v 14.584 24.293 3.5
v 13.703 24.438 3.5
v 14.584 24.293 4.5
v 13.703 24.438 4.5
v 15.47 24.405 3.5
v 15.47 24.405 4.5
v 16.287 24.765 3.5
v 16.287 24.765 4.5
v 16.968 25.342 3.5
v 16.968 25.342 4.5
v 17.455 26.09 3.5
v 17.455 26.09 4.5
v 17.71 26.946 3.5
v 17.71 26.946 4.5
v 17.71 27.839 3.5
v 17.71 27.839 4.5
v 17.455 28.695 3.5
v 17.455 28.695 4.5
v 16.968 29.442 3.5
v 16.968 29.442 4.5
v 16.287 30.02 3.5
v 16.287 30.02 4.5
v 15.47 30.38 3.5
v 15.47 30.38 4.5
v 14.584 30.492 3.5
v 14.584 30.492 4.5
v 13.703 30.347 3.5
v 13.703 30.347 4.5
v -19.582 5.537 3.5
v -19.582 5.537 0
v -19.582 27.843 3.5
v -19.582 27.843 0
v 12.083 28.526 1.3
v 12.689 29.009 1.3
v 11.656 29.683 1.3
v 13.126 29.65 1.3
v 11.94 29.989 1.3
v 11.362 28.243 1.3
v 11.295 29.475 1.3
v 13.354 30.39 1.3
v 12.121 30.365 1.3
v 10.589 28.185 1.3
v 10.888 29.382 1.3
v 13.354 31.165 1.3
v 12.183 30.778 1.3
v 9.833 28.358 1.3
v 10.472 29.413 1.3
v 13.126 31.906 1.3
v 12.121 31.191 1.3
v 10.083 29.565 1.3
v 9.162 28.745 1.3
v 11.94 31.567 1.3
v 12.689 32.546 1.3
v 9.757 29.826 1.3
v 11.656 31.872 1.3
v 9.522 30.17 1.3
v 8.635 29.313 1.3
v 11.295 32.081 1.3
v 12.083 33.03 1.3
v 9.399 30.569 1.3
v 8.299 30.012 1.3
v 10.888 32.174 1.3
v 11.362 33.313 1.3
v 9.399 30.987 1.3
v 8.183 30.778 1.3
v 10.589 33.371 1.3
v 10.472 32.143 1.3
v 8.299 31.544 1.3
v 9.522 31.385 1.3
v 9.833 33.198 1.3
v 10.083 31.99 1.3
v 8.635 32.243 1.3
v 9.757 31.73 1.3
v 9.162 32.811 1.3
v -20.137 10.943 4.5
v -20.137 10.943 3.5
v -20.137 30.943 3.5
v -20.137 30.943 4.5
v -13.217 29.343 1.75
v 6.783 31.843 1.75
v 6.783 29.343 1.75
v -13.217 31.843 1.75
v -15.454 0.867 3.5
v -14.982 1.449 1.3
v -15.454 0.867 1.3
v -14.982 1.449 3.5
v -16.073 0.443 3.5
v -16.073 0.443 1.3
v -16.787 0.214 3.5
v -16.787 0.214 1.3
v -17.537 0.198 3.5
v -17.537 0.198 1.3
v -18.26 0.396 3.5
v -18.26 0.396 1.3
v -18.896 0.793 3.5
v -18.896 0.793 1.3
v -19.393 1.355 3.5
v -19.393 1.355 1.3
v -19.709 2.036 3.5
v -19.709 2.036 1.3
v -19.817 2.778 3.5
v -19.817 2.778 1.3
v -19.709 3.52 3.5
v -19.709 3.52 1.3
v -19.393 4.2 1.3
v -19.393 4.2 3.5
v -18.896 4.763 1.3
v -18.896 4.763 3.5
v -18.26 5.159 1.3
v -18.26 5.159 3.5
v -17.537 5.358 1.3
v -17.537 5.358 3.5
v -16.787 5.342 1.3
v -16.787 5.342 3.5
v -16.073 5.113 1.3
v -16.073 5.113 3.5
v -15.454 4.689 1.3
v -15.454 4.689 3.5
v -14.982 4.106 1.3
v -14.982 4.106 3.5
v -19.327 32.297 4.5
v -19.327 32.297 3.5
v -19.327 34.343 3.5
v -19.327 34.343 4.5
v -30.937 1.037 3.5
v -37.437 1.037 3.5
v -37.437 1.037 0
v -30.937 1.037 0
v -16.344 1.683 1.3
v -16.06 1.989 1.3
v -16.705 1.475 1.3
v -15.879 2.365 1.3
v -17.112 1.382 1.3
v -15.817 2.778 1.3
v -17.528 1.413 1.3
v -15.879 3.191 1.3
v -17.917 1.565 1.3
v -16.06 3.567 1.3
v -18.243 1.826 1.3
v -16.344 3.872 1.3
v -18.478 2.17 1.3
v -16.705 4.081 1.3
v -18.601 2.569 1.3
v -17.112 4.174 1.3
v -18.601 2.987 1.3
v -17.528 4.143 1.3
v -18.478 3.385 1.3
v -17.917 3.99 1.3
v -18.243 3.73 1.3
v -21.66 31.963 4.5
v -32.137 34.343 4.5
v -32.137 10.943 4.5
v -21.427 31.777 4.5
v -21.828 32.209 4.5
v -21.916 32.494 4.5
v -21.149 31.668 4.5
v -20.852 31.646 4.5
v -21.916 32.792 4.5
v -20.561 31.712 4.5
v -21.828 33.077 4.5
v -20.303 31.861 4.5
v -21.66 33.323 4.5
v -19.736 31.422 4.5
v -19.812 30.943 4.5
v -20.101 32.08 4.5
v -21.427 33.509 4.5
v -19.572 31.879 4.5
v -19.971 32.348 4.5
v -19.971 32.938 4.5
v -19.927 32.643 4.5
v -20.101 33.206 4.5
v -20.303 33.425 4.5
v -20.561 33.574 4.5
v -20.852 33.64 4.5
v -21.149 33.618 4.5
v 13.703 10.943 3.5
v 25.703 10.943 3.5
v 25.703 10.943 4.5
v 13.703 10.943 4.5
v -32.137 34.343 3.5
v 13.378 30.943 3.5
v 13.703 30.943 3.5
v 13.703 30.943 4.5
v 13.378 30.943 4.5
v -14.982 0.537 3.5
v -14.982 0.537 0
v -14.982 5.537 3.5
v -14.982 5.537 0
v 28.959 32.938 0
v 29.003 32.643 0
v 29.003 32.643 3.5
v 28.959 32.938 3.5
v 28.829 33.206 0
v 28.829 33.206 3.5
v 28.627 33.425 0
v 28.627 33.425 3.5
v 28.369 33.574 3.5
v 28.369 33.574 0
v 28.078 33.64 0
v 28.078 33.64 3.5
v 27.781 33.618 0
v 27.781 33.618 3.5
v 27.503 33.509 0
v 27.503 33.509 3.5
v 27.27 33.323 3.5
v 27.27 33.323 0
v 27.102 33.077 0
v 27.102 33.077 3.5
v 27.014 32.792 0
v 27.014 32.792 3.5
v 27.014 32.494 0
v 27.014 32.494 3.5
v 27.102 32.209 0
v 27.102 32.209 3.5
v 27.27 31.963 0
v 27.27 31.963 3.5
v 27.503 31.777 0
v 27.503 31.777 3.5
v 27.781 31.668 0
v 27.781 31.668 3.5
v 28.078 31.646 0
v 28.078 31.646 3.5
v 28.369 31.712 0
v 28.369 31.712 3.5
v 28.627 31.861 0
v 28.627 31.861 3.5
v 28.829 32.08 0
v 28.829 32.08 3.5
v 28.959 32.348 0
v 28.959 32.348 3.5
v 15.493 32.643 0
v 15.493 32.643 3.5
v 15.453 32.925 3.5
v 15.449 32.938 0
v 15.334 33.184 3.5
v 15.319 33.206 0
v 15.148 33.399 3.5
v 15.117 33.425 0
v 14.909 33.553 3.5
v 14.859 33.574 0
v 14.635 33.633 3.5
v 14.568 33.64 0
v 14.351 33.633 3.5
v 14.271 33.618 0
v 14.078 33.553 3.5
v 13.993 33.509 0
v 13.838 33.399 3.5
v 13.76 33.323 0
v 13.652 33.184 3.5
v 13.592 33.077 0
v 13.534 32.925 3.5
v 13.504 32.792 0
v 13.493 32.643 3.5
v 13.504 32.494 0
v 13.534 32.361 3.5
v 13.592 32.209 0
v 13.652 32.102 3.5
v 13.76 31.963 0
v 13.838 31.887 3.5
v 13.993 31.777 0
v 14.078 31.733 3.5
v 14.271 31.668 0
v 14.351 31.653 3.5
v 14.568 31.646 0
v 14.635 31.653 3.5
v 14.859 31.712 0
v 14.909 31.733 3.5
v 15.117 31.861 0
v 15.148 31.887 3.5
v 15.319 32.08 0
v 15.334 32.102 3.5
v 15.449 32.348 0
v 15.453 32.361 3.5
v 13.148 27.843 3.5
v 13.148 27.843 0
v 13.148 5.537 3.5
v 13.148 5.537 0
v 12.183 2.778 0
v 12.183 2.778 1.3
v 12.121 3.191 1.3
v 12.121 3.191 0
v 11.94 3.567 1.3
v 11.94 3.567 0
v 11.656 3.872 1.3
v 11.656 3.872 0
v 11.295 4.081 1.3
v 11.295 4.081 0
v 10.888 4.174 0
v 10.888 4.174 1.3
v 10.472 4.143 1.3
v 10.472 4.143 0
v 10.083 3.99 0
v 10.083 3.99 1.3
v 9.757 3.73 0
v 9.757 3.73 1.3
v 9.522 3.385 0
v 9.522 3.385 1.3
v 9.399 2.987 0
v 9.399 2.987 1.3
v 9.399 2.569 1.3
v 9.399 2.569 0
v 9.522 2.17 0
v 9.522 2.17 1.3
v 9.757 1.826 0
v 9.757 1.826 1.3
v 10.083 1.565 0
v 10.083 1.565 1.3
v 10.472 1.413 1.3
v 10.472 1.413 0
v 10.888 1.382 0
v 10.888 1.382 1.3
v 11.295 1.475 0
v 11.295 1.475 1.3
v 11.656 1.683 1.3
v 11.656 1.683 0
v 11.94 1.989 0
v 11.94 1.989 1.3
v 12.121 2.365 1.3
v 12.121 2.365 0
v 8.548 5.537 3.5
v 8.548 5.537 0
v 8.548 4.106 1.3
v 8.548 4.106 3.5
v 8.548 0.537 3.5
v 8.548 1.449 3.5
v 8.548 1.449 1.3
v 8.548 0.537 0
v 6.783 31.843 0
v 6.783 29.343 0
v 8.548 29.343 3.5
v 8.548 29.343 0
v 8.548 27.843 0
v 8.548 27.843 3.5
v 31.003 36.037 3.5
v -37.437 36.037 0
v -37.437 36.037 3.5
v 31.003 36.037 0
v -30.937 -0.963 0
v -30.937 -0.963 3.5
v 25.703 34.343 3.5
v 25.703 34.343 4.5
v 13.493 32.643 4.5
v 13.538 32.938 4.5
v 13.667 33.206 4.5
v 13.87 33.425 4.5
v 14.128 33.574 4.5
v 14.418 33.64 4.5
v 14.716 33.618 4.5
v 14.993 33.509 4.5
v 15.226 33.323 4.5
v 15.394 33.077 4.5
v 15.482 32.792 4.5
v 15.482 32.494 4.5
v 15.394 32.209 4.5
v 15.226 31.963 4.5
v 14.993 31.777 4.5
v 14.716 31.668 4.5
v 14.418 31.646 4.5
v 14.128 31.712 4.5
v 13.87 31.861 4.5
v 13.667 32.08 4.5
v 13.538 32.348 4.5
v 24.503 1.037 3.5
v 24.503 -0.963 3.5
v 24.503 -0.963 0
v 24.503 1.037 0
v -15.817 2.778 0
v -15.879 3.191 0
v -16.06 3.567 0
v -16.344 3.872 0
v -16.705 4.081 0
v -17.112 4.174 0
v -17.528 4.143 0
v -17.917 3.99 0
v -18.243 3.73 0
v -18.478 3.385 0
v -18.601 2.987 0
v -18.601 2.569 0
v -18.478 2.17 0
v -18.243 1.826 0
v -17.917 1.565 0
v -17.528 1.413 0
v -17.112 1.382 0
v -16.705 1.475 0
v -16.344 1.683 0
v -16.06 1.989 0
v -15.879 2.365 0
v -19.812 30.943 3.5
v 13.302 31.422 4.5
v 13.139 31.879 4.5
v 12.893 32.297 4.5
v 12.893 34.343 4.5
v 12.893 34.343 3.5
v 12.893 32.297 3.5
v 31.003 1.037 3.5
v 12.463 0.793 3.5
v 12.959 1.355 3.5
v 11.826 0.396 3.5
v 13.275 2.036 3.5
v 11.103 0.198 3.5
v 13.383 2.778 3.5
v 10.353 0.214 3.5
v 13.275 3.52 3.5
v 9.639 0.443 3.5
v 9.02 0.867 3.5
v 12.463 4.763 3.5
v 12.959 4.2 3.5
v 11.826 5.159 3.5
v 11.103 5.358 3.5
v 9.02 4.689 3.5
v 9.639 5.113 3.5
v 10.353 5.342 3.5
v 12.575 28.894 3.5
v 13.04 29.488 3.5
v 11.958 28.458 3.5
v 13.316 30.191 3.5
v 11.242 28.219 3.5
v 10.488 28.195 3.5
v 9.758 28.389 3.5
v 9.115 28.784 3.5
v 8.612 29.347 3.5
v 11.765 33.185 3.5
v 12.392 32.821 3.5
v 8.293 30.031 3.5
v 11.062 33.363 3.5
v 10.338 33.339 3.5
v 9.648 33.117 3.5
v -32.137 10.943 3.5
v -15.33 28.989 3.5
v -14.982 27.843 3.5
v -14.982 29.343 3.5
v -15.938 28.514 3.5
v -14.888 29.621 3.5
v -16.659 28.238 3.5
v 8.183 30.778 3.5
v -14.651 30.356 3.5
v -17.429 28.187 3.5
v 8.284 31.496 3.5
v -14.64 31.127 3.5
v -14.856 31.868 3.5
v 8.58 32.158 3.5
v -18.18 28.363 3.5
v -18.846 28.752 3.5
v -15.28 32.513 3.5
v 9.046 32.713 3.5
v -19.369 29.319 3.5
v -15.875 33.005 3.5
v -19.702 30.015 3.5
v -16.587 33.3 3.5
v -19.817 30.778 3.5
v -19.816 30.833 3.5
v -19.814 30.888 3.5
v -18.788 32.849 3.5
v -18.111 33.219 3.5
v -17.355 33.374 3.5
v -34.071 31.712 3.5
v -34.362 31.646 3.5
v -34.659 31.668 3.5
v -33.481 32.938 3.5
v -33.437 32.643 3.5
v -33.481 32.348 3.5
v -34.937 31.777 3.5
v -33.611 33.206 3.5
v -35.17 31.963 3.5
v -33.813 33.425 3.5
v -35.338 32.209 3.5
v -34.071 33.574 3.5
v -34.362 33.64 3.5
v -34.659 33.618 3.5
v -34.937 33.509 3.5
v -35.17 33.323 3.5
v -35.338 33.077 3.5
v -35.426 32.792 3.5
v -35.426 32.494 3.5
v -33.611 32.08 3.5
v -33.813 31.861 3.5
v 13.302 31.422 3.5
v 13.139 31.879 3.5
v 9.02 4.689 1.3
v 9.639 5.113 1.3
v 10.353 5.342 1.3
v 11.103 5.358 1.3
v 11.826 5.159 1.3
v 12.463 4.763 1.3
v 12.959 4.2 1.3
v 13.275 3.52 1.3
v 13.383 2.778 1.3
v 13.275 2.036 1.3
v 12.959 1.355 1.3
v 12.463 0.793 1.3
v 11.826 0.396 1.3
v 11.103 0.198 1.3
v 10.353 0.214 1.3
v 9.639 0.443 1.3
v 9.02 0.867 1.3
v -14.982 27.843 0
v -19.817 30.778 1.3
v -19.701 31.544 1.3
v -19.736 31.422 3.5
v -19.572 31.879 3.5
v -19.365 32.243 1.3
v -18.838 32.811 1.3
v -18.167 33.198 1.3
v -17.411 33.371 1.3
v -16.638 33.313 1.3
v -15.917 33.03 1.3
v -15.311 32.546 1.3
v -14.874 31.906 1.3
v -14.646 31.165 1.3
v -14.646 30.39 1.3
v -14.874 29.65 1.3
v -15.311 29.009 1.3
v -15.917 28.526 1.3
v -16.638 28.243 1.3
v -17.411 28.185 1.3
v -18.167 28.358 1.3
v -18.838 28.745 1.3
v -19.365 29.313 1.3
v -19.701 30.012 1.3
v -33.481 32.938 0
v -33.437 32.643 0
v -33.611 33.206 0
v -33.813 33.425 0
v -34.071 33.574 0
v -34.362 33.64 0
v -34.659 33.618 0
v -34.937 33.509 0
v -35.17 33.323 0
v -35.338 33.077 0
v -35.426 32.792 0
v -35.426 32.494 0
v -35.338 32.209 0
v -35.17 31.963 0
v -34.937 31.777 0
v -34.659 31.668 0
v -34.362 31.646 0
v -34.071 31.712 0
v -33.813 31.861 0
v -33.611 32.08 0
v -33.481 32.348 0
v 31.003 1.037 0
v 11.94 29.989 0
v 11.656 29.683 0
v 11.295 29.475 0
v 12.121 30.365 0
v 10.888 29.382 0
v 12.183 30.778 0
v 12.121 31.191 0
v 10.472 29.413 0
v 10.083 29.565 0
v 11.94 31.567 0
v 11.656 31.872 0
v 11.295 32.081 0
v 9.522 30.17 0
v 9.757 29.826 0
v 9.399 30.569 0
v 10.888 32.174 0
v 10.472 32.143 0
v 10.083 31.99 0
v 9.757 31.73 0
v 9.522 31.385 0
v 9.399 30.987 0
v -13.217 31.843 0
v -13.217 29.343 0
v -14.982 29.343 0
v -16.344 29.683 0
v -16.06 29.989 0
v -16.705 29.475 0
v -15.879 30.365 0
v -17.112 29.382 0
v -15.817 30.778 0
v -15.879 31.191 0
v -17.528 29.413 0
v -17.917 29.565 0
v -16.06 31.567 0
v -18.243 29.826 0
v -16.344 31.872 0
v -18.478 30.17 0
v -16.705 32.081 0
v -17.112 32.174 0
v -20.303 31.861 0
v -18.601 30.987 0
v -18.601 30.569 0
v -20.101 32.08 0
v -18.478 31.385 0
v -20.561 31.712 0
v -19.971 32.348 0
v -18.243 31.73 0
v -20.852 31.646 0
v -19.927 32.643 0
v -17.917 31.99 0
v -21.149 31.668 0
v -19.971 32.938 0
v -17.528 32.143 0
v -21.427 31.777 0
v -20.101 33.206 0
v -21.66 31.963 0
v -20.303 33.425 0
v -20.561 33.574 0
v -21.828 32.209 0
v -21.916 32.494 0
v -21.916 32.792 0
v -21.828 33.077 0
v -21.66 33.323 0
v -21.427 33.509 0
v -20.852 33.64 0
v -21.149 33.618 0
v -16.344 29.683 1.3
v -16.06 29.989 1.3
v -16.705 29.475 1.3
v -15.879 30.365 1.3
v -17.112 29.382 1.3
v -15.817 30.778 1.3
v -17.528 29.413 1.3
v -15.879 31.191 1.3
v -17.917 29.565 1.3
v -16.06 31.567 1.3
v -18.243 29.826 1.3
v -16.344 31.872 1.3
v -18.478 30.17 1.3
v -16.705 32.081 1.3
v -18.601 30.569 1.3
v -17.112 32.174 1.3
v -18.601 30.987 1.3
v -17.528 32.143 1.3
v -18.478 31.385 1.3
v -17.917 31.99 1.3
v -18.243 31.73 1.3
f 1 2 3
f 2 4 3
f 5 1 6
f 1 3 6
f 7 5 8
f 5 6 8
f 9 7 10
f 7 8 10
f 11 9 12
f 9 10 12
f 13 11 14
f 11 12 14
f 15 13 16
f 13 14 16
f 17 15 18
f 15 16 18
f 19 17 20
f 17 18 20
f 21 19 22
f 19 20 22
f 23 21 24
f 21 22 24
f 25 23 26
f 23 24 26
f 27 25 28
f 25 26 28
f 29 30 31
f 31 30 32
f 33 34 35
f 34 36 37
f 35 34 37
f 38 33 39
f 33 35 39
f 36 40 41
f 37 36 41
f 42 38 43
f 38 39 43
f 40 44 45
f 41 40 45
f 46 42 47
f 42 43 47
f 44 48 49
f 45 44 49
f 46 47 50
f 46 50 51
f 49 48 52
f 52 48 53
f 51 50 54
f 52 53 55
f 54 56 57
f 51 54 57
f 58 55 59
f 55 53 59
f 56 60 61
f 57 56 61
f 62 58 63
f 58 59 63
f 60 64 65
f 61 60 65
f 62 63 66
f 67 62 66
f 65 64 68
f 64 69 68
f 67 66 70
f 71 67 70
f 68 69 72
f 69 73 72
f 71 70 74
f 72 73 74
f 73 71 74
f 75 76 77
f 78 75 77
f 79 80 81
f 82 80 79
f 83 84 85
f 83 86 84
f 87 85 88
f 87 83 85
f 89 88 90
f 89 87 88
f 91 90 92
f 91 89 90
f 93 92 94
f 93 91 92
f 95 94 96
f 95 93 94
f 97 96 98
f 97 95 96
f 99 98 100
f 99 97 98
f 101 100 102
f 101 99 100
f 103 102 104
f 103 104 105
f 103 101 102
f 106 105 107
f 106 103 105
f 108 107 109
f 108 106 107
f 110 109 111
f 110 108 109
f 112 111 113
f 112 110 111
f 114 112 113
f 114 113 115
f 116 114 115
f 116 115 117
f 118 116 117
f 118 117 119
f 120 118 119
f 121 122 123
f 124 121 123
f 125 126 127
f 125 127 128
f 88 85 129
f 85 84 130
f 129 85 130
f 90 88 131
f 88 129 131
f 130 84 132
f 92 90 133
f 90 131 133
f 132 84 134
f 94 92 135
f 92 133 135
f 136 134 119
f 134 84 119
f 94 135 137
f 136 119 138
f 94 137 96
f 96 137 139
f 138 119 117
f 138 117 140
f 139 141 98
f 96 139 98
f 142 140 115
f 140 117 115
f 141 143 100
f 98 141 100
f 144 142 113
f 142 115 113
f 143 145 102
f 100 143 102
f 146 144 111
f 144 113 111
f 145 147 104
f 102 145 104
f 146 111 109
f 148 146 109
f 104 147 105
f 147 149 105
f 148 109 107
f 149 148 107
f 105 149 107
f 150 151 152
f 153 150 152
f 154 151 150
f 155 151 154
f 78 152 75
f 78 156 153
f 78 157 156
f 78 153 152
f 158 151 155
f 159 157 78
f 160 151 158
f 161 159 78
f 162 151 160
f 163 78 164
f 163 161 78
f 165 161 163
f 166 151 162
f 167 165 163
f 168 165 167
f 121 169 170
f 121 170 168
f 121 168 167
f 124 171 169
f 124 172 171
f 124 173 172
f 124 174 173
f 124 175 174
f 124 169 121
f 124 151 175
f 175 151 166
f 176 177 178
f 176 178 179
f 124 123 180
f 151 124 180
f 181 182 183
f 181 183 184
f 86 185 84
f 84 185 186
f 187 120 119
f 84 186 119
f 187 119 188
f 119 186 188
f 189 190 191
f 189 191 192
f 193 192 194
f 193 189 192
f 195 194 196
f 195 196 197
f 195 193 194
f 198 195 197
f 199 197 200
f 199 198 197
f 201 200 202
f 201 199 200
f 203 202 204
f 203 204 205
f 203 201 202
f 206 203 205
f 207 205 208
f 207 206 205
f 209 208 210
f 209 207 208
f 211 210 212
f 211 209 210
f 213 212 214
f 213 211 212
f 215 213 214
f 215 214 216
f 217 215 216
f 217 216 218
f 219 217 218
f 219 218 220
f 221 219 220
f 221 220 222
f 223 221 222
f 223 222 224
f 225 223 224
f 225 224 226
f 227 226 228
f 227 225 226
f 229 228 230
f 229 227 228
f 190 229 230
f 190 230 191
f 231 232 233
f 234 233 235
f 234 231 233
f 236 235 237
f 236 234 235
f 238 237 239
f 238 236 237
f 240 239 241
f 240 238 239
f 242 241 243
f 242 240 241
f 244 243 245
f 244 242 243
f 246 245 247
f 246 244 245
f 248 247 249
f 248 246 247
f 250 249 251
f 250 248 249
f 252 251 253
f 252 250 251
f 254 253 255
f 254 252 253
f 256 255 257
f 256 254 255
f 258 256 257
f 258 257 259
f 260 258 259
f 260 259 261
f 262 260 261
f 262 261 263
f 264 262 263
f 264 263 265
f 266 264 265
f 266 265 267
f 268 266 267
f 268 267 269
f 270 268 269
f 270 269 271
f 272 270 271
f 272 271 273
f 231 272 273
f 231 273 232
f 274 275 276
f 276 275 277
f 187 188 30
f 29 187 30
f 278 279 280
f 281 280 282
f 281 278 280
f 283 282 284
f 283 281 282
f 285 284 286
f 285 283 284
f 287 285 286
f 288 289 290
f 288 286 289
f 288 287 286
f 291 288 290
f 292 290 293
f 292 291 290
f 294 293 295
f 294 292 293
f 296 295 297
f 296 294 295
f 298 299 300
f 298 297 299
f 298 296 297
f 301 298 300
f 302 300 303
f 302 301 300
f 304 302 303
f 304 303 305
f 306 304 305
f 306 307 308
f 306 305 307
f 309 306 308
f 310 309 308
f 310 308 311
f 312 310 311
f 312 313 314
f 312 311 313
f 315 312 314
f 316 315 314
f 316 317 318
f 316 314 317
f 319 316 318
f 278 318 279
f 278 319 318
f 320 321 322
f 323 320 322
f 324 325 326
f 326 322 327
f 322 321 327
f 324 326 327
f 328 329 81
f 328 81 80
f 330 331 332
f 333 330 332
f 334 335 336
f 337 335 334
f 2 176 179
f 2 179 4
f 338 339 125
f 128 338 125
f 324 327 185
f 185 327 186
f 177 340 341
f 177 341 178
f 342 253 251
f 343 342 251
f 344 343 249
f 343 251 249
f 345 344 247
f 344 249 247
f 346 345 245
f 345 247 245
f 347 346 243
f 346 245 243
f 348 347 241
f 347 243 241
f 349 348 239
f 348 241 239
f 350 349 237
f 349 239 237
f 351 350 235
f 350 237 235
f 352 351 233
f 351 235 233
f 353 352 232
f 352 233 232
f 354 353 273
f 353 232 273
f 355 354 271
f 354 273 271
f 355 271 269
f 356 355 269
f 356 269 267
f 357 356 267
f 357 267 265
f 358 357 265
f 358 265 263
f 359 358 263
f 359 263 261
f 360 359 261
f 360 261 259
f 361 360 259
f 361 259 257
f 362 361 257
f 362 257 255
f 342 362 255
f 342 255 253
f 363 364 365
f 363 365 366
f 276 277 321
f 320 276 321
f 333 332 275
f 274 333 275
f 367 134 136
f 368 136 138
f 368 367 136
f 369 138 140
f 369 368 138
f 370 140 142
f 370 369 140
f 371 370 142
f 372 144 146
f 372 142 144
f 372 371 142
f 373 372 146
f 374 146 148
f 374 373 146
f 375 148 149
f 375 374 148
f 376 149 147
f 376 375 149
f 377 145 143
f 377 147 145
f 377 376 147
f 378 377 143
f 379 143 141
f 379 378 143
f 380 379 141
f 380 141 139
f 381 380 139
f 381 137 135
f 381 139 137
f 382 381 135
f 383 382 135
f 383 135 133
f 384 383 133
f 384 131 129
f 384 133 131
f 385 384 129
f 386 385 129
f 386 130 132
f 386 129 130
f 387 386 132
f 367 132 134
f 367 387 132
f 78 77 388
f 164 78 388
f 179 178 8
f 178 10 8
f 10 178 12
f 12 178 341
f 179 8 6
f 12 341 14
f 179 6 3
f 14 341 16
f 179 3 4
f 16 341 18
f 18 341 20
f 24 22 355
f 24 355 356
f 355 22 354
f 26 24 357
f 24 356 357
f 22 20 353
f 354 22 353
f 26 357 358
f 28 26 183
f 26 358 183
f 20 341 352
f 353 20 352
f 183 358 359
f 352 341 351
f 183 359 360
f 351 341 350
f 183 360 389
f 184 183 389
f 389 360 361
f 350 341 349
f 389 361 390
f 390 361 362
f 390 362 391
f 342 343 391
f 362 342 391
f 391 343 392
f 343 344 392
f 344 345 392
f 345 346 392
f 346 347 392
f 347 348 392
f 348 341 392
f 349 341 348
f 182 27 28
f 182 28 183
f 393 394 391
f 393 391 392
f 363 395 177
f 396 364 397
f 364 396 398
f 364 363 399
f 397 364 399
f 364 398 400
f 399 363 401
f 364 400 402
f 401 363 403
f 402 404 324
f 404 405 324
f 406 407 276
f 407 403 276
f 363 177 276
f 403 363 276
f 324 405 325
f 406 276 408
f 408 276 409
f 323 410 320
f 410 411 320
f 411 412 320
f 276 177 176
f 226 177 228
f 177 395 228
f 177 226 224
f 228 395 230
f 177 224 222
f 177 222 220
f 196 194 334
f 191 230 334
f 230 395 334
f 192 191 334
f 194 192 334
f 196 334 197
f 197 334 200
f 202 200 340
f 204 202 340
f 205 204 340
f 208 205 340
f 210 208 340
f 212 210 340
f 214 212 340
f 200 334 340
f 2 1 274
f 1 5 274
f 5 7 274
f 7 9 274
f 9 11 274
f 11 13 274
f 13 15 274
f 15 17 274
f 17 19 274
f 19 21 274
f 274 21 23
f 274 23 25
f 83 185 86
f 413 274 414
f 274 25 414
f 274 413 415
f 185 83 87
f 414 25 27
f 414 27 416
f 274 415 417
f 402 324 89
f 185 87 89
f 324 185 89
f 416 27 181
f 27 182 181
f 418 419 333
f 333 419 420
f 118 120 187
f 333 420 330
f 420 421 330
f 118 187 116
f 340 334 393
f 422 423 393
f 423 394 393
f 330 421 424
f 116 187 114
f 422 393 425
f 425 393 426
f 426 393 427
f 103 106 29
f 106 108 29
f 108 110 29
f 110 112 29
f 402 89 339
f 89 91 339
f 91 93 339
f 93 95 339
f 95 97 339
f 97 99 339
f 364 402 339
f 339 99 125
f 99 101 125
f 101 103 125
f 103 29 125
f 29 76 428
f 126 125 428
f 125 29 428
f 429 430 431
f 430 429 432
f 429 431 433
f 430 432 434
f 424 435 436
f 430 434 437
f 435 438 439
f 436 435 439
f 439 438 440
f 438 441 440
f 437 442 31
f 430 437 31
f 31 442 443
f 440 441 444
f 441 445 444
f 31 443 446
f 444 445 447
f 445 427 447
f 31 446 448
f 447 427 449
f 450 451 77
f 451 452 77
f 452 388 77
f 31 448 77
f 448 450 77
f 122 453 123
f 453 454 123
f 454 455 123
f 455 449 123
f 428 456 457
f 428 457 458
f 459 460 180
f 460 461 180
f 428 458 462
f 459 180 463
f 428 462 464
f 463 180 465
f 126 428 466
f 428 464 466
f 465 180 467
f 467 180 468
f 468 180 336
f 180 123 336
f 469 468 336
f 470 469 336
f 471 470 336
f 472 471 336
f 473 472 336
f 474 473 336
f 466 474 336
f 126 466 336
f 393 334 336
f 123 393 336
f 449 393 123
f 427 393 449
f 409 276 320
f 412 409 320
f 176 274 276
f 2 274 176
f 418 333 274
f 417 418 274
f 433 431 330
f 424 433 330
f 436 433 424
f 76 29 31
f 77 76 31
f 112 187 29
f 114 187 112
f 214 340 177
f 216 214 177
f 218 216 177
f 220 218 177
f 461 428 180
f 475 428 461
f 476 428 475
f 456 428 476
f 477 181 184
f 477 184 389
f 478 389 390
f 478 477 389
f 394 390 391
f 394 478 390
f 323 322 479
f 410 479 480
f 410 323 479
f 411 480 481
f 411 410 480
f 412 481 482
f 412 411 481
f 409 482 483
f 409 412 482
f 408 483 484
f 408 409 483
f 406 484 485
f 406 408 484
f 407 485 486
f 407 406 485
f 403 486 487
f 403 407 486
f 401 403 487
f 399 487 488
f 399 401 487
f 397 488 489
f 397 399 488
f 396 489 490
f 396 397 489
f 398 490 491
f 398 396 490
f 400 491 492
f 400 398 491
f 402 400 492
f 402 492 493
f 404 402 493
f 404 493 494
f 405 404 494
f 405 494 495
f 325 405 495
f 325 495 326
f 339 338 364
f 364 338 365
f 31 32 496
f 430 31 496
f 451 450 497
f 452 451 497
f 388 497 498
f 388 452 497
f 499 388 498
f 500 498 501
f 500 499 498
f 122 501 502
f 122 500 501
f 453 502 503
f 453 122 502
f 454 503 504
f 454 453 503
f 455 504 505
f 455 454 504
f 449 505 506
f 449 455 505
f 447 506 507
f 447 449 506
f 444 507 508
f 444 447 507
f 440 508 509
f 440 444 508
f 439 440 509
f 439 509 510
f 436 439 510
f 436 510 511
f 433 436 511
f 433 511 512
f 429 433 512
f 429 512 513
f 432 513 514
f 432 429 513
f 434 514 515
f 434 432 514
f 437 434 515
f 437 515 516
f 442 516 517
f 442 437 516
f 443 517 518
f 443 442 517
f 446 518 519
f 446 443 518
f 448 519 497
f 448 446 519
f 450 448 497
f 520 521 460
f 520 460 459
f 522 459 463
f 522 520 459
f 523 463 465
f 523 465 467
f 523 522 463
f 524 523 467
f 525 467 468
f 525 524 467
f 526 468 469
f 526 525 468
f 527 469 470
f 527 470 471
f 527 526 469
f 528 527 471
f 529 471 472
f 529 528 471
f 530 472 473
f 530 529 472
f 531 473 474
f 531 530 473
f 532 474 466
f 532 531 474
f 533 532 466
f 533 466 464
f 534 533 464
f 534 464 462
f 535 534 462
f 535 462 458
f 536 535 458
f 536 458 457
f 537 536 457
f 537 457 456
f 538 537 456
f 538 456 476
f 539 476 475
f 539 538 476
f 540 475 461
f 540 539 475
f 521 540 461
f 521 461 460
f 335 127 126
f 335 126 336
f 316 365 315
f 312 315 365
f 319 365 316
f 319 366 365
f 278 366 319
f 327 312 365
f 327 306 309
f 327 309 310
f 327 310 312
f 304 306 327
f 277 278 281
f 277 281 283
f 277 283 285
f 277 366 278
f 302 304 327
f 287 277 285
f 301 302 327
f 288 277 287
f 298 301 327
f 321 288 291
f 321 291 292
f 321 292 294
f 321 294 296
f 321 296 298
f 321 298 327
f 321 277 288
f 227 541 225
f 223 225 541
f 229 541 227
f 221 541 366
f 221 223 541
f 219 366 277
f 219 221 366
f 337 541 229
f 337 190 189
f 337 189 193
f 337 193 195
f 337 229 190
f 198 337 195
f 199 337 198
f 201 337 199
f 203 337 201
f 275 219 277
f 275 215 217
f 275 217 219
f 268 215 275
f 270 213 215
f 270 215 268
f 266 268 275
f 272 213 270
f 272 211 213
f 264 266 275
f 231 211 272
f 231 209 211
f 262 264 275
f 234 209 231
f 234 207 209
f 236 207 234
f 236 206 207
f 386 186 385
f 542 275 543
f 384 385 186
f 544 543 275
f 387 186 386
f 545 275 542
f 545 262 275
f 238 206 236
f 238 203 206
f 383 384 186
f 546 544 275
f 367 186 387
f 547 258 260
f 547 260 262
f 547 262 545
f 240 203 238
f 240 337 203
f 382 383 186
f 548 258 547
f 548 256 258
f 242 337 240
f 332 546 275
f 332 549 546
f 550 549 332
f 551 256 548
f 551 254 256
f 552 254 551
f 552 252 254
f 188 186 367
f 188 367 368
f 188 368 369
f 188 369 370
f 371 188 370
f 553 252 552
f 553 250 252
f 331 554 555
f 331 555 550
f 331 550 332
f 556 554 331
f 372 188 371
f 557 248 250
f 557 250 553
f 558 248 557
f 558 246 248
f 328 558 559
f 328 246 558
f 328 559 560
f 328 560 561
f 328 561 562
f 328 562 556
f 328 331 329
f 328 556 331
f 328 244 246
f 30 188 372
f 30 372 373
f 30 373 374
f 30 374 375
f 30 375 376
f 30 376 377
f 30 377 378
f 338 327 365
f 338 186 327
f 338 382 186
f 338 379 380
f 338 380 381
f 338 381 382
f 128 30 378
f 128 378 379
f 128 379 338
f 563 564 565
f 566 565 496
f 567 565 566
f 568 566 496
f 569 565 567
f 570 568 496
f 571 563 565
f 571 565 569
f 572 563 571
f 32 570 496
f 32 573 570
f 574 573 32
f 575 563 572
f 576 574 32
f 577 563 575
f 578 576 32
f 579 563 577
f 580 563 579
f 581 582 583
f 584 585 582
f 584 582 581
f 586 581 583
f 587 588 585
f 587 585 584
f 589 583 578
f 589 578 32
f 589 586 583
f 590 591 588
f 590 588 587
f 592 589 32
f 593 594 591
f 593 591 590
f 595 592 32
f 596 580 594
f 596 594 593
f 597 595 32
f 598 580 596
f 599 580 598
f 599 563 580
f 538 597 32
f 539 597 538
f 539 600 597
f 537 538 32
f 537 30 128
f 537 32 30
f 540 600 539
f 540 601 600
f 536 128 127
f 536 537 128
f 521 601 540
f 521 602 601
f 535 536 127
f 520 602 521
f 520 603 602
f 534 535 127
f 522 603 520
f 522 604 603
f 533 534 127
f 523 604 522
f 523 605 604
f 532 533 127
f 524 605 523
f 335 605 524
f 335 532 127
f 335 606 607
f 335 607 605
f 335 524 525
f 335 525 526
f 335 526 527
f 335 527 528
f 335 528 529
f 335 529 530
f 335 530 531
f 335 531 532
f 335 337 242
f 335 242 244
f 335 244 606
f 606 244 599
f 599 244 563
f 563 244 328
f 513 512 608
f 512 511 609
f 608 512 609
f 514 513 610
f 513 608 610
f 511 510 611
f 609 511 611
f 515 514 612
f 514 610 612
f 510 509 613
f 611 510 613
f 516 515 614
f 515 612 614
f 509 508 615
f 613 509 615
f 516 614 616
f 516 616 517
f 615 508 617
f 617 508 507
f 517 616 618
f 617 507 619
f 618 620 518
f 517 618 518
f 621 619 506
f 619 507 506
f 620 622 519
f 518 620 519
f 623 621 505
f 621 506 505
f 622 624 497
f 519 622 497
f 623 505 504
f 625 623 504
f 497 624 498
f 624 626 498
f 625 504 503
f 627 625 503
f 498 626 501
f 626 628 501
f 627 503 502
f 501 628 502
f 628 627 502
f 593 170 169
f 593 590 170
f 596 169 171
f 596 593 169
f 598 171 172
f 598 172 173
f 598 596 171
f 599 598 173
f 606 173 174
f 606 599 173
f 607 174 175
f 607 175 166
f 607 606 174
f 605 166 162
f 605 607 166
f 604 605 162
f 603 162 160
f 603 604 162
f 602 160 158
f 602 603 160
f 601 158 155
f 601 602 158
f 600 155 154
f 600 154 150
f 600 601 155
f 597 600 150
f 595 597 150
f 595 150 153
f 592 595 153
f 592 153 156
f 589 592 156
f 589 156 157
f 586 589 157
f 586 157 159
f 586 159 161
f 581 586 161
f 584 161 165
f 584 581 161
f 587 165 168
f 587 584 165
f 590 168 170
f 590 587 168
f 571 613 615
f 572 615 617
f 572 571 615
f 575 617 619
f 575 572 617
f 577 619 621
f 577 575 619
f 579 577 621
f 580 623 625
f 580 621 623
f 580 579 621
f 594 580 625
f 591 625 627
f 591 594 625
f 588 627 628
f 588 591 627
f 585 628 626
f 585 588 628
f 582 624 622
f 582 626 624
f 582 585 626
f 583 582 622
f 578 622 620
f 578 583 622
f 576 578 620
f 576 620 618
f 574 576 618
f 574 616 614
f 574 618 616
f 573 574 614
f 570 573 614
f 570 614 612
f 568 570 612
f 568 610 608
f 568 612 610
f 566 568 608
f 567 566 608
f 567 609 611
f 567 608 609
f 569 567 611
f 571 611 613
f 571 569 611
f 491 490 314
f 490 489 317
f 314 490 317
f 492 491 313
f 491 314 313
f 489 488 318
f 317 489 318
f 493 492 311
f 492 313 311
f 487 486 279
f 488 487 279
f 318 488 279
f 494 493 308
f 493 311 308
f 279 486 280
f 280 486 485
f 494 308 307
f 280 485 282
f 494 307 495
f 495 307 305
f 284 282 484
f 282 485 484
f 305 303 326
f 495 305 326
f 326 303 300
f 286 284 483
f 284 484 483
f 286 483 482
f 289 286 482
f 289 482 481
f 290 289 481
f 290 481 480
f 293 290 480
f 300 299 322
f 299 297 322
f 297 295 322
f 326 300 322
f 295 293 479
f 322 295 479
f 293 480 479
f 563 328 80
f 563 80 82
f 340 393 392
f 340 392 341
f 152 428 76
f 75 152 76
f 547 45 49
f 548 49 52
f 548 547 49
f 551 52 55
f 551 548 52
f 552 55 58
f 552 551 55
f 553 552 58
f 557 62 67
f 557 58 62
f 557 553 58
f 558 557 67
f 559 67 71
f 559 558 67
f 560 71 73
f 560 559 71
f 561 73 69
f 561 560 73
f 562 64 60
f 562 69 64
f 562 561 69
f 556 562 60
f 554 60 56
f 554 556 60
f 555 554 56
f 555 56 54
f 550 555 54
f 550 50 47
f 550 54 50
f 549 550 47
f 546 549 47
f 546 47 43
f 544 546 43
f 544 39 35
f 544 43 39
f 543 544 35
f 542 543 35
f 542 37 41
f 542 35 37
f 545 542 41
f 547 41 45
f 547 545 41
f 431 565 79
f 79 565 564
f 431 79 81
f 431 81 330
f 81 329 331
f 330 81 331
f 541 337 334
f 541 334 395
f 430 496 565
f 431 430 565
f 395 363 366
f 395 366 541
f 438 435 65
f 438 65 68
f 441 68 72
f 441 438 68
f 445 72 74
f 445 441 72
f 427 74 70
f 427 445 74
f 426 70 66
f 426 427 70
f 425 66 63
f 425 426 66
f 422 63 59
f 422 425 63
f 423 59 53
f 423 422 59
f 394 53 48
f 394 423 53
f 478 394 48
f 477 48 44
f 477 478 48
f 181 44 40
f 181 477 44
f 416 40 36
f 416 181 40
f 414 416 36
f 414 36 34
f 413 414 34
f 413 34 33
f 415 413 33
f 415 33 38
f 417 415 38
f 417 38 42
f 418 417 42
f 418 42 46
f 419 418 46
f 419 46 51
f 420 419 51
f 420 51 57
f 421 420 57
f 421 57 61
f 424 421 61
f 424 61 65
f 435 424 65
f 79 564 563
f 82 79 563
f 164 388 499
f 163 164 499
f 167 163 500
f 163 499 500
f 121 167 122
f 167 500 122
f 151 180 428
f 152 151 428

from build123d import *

# Parameters (mm, degrees)
SKETCH3_R           = 1.4
SKETCH3_R_2         = 1
BOSS_EXTRUDE1_DEPTH = 3.5
SKETCH9_R           = 2.6
CUT_EXTRUDE1_DEPTH  = 2.2
SKETCH10_W          = 20
SKETCH10_H          = 2.5
CUT_EXTRUDE2_DEPTH  = 1.75
SKETCH11_R          = 1
BOSS_EXTRUDE2_DEPTH = 1
SKETCH14_R          = 3.1
CUT_EXTRUDE3_DEPTH  = 1
SKETCH15_W          = 6.5
SKETCH15_H          = 2
CUT_EXTRUDE4_DEPTH  = 53.08126138


with BuildPart() as part:
    # Sketch3 → Boss-Extrude1 (new body)
    with BuildSketch(Plane.XY):
        Polygon((-37.436821352, -0.962627815), (-37.436821352, 36.037372185), (31.003178648, 36.037372185), (31.003178648, -0.962627815), (7.298178648, -0.962627815), (-14.831821352, -0.962627815), align=None)
        with Locations((-17.216821352, 30.777902568)):
            Circle(SKETCH3_R, mode=Mode.SUBTRACT)
        with Locations((-34.436821352, 32.642902568)):
            Circle(SKETCH3_R_2, mode=Mode.SUBTRACT)
        with Locations((-20.926821352, 32.642902568)):
            Circle(SKETCH3_R_2, mode=Mode.SUBTRACT)
        with Locations((14.493178648, 32.642902568)):
            Circle(SKETCH3_R_2, mode=Mode.SUBTRACT)
        with Locations((28.003178648, 32.642902568)):
            Circle(SKETCH3_R_2, mode=Mode.SUBTRACT)
        with Locations((-17.216821352, 2.777902568)):
            Circle(SKETCH3_R, mode=Mode.SUBTRACT)
        with Locations((10.783178648, 30.777902568)):
            Circle(SKETCH3_R, mode=Mode.SUBTRACT)
        with Locations((10.783178648, 2.777902568)):
            Circle(SKETCH3_R, mode=Mode.SUBTRACT)
        Polygon((-14.981821352, 0.537372185), (-14.981821352, 5.537372185), (-19.581821352, 5.537372185), (-19.581821352, 27.842902568), (-14.981821352, 27.842902568), (-14.981821352, 29.342902568), (8.548178648, 29.342902568), (8.548178648, 27.842902568), (13.148178648, 27.842902568), (13.148178648, 5.537372185), (8.548178648, 5.537372185), (8.548178648, 0.537372185), align=None, mode=Mode.SUBTRACT)
    extrude(amount=BOSS_EXTRUDE1_DEPTH)

    # Sketch9 → Cut-Extrude1 (cut)
    with BuildSketch(Plane(origin=(0, 0, 3.5), x_dir=(-1, 0, 0), z_dir=(0, 0, -1))):
        with Locations((-10.783178648, 30.777902568)):
            Circle(SKETCH9_R)
        with Locations((17.216821352, 30.777902568)):
            Circle(SKETCH9_R)
        with Locations((-10.783178648, 2.777902568)):
            Circle(SKETCH9_R)
        with Locations((17.216821352, 2.777902568)):
            Circle(SKETCH9_R)
    extrude(amount=CUT_EXTRUDE1_DEPTH, mode=Mode.SUBTRACT)

    # Sketch10 → Cut-Extrude2 (cut)
    with BuildSketch(Plane(origin=(0, 0, 0), x_dir=(-1, 0, 0), z_dir=(0, 0, -1))):
        with Locations((3.216821352, 30.592902568)):
            Rectangle(SKETCH10_W, SKETCH10_H)
    extrude(amount=-CUT_EXTRUDE2_DEPTH, mode=Mode.SUBTRACT)

    # Sketch11 → Boss-Extrude2 (add)
    with BuildSketch(Plane.XY.offset(3.5)):
        with BuildLine():
            Line((-32.136821352, 30.942902568), (-32.136821352, 10.942902568))
            Line((-32.136821352, 10.942902568), (-20.136821352, 10.942902568))
            Line((-20.136821352, 10.942902568), (-20.136821352, 30.942902568))
            Line((-20.136821352, 30.942902568), (-19.811580493, 30.942902568))
            ThreePointArc((-19.811580493, 30.942902568), (-19.664705899, 31.654179489), (-19.326821352, 32.297079977))
            Line((-19.326821352, 32.297079977), (-19.326821352, 34.342902568))
            Line((-19.326821352, 34.342902568), (-32.136821352, 34.342902568))
            Line((-32.136821352, 34.342902568), (-32.136821352, 30.942902568))
        make_face()
        with Locations((-20.926821352, 32.642902568)):
            Circle(SKETCH11_R, mode=Mode.SUBTRACT)
    boss_extrude2 = extrude(amount=BOSS_EXTRUDE2_DEPTH)

    # Mirror1: Boss-Extrude2 across plane
    add(boss_extrude2.mirror(Plane.ZY.offset(3.216821352)))

    # Sketch14 → Cut-Extrude3 (cut)
    with BuildSketch(Plane.XY.offset(4.5)):
        with Locations((14.642214959, 27.392343087)):
            Circle(SKETCH14_R)
    extrude(amount=-CUT_EXTRUDE3_DEPTH, mode=Mode.SUBTRACT)

    # Sketch15 → Cut-Extrude4 (cut, through all)
    with BuildSketch(Plane.XY.offset(3.5)):
        with Locations((-34.186821352, 0.037372185)):
            Rectangle(SKETCH15_W, SKETCH15_H)
        with Locations((27.753178648, 0.037372185)):
            Rectangle(SKETCH15_W, SKETCH15_H)
    extrude(amount=-CUT_EXTRUDE4_DEPTH, mode=Mode.SUBTRACT)


solid = part.part
